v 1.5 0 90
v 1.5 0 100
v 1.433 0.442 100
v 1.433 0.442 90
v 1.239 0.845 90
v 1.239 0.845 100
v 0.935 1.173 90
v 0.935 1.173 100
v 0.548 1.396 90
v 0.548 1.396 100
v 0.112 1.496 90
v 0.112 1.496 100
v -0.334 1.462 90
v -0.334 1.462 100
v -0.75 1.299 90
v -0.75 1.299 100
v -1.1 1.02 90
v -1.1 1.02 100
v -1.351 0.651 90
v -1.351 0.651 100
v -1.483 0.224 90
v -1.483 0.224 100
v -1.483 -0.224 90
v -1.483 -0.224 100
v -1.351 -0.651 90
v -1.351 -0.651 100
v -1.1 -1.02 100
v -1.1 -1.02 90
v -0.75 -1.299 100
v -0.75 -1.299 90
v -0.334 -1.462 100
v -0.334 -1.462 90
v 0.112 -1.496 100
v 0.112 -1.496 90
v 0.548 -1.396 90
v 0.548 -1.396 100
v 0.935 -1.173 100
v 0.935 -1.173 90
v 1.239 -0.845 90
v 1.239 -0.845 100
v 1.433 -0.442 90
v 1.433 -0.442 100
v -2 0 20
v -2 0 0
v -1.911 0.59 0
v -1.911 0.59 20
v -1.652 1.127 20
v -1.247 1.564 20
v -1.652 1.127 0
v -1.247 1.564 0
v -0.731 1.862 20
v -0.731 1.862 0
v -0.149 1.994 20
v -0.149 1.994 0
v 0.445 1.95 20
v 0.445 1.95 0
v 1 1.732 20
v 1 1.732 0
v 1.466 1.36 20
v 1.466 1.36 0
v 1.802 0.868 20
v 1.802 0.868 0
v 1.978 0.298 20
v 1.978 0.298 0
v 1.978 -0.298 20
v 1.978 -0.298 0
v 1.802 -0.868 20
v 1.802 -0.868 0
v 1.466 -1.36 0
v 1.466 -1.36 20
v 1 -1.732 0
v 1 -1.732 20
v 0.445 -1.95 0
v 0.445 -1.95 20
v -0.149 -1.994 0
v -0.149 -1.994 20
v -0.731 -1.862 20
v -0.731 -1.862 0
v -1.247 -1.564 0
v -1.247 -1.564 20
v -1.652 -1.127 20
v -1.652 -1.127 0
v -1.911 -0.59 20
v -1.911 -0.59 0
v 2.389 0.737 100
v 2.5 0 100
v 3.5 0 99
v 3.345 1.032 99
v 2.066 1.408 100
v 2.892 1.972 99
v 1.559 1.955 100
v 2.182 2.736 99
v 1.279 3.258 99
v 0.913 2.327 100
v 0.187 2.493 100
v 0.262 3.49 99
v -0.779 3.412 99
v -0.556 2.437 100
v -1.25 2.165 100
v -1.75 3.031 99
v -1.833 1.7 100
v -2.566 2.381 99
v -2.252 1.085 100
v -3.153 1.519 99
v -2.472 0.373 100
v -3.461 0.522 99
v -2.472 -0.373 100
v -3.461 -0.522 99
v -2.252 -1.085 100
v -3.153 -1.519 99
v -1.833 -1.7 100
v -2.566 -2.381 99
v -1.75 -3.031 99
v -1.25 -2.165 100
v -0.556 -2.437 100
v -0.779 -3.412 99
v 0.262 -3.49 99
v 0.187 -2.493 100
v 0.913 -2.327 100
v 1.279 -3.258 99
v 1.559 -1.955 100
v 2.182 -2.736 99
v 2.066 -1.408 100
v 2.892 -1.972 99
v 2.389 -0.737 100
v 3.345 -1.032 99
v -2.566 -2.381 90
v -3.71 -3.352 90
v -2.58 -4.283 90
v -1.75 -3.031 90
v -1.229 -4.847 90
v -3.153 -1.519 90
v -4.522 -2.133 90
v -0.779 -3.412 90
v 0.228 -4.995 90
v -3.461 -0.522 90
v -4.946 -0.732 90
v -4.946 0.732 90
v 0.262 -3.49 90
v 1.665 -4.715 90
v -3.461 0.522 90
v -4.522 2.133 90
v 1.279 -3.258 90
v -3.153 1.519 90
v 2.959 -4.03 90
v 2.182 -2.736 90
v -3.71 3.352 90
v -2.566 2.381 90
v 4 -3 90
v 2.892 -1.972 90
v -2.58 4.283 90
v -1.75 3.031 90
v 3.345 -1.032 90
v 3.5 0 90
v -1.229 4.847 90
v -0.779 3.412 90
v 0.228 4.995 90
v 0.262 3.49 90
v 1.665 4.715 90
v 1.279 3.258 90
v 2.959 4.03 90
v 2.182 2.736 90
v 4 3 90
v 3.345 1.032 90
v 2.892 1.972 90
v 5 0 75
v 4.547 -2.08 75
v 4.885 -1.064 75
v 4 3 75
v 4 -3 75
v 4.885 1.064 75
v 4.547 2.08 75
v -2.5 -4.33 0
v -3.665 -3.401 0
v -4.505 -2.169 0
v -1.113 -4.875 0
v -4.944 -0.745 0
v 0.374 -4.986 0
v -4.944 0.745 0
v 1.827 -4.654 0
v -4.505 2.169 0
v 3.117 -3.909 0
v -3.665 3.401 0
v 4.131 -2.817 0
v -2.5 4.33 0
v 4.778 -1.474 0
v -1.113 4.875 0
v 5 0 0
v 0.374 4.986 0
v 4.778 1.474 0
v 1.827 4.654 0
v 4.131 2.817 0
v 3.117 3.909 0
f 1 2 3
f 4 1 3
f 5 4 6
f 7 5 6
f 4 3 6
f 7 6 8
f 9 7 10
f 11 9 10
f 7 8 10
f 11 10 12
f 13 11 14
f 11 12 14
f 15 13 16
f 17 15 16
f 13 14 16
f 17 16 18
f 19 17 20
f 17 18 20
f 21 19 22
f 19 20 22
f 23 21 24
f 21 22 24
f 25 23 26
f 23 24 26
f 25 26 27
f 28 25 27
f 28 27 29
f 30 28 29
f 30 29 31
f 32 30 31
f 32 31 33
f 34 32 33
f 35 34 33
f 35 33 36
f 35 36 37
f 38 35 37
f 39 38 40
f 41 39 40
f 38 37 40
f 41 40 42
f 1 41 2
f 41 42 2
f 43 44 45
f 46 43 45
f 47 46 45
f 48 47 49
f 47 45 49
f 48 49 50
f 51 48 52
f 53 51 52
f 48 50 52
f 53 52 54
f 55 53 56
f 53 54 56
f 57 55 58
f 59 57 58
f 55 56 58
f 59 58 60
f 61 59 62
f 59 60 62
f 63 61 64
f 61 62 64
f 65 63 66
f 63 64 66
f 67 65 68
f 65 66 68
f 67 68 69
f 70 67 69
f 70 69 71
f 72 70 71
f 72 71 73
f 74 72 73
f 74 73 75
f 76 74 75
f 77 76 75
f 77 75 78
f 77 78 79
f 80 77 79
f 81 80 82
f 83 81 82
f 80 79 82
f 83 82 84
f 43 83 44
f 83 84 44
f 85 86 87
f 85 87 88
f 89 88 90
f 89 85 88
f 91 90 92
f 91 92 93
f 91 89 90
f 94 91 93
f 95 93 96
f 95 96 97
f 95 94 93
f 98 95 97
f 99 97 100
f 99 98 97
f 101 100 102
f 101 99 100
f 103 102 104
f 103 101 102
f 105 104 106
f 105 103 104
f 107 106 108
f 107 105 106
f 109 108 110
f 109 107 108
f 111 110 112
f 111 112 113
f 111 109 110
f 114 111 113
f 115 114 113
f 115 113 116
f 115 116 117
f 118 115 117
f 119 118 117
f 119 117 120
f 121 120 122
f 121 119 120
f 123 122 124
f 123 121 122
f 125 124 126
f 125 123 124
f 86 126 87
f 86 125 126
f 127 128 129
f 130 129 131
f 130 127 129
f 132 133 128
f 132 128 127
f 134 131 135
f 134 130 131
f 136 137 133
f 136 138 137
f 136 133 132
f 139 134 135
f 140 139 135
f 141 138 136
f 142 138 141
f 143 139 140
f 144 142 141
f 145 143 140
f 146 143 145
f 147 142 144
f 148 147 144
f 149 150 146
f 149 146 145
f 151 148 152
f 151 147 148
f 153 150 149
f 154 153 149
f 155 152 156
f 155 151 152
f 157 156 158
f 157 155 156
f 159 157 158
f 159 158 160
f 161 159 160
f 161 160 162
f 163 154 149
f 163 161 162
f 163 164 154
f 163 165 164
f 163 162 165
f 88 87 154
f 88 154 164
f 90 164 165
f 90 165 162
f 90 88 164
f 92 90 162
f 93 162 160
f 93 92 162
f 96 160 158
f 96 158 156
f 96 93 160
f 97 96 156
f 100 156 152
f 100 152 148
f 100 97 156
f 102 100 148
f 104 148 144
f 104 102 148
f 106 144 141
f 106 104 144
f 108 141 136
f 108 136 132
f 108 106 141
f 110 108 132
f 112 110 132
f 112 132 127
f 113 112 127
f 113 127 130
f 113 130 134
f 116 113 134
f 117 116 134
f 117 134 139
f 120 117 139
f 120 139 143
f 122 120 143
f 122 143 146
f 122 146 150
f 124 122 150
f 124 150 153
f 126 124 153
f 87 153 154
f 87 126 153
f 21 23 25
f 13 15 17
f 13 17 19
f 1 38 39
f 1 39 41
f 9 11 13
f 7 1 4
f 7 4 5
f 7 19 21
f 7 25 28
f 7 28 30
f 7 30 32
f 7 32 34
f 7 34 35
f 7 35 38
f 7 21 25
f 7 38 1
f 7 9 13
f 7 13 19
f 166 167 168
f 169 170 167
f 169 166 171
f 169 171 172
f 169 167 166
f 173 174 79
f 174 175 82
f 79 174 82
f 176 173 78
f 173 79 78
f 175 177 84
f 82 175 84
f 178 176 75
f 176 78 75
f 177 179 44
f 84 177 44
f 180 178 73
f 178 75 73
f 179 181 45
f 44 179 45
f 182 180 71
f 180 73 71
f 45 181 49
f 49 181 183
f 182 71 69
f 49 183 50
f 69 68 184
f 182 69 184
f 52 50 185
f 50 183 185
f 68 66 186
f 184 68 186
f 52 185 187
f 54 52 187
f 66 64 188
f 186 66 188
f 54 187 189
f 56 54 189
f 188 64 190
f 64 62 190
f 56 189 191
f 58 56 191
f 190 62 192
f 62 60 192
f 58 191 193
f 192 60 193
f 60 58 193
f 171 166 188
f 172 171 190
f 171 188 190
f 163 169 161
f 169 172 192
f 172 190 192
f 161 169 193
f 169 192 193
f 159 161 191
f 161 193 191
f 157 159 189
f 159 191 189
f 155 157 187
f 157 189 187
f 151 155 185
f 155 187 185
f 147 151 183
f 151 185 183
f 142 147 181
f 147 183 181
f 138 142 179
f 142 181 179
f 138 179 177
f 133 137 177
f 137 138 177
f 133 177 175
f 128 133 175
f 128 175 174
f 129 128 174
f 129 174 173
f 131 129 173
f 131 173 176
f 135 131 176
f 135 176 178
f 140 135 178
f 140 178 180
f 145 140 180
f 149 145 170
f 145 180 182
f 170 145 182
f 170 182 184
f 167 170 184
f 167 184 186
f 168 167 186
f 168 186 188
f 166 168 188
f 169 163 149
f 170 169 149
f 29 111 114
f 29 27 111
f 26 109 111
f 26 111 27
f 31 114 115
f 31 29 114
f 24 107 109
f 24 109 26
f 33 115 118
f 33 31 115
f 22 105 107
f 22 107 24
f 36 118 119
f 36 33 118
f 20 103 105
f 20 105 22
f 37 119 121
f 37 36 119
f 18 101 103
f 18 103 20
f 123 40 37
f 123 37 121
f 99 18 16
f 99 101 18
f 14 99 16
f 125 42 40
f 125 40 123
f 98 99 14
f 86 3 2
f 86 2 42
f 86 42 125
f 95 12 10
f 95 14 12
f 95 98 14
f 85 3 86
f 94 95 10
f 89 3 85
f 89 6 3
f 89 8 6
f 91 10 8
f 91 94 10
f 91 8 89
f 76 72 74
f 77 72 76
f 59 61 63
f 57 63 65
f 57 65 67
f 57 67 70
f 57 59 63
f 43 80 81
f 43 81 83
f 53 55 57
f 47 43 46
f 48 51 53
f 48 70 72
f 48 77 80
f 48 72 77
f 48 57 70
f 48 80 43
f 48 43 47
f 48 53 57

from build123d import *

# Parameters (mm, degrees)
SKETCH1_R          = 5
BASE_EXTRUDE_DEPTH = 100
SKETCH5_OUTSIDE_W  = 32.2
SKETCH5_OUTSIDE_H  = 32.2
SKETCH5_OUTSIDE_R  = 3.5
FRONT_CUT_DEPTH    = 10
SKETCH2_R          = 1.5
FRONT_HOLE_DEPTH   = 10
CHAMFER1_SIZE      = 1
KEYWAY_CUT_DEPTH   = 15
SKETCH4_R          = 2
BACK_HOLE_DEPTH    = 20


with BuildPart() as part:
    # Sketch1 → Base Extrude (new body)
    with BuildSketch(Plane.XY):
        Circle(SKETCH1_R)
    extrude(amount=BASE_EXTRUDE_DEPTH)

    # Sketch5 outside → Front Cut (cut)
    with BuildSketch(Plane.XY.offset(100)):
        Rectangle(SKETCH5_OUTSIDE_W, SKETCH5_OUTSIDE_H)
        Circle(SKETCH5_OUTSIDE_R, mode=Mode.SUBTRACT)
    extrude(amount=-FRONT_CUT_DEPTH, mode=Mode.SUBTRACT)

    # Sketch2 → Front Hole (cut)
    with BuildSketch(Plane.XY.offset(100)):
        Circle(SKETCH2_R)
    extrude(amount=-FRONT_HOLE_DEPTH, mode=Mode.SUBTRACT)

    # Chamfer1
    chamfer1_edges = [part.edges().sort_by_distance(p)[0] for p in [
        (-3.5, 0, 100),
    ]]
    chamfer(chamfer1_edges, length=CHAMFER1_SIZE)

    # Sketch3 → Keyway Cut (cut)
    with BuildSketch(Plane.XY.offset(90)):
        with BuildLine():
            Line((4, 3), (4, -3))
            ThreePointArc((4, -3), (5, 0), (4, 3))
        make_face()
    extrude(amount=-KEYWAY_CUT_DEPTH, mode=Mode.SUBTRACT)

    # Sketch4 → Back Hole (cut)
    with BuildSketch(Plane(origin=(0, 0, 0), x_dir=(-1, 0, 0), z_dir=(0, 0, -1))):
        Circle(SKETCH4_R)
    extrude(amount=-BACK_HOLE_DEPTH, mode=Mode.SUBTRACT)


solid = part.part
